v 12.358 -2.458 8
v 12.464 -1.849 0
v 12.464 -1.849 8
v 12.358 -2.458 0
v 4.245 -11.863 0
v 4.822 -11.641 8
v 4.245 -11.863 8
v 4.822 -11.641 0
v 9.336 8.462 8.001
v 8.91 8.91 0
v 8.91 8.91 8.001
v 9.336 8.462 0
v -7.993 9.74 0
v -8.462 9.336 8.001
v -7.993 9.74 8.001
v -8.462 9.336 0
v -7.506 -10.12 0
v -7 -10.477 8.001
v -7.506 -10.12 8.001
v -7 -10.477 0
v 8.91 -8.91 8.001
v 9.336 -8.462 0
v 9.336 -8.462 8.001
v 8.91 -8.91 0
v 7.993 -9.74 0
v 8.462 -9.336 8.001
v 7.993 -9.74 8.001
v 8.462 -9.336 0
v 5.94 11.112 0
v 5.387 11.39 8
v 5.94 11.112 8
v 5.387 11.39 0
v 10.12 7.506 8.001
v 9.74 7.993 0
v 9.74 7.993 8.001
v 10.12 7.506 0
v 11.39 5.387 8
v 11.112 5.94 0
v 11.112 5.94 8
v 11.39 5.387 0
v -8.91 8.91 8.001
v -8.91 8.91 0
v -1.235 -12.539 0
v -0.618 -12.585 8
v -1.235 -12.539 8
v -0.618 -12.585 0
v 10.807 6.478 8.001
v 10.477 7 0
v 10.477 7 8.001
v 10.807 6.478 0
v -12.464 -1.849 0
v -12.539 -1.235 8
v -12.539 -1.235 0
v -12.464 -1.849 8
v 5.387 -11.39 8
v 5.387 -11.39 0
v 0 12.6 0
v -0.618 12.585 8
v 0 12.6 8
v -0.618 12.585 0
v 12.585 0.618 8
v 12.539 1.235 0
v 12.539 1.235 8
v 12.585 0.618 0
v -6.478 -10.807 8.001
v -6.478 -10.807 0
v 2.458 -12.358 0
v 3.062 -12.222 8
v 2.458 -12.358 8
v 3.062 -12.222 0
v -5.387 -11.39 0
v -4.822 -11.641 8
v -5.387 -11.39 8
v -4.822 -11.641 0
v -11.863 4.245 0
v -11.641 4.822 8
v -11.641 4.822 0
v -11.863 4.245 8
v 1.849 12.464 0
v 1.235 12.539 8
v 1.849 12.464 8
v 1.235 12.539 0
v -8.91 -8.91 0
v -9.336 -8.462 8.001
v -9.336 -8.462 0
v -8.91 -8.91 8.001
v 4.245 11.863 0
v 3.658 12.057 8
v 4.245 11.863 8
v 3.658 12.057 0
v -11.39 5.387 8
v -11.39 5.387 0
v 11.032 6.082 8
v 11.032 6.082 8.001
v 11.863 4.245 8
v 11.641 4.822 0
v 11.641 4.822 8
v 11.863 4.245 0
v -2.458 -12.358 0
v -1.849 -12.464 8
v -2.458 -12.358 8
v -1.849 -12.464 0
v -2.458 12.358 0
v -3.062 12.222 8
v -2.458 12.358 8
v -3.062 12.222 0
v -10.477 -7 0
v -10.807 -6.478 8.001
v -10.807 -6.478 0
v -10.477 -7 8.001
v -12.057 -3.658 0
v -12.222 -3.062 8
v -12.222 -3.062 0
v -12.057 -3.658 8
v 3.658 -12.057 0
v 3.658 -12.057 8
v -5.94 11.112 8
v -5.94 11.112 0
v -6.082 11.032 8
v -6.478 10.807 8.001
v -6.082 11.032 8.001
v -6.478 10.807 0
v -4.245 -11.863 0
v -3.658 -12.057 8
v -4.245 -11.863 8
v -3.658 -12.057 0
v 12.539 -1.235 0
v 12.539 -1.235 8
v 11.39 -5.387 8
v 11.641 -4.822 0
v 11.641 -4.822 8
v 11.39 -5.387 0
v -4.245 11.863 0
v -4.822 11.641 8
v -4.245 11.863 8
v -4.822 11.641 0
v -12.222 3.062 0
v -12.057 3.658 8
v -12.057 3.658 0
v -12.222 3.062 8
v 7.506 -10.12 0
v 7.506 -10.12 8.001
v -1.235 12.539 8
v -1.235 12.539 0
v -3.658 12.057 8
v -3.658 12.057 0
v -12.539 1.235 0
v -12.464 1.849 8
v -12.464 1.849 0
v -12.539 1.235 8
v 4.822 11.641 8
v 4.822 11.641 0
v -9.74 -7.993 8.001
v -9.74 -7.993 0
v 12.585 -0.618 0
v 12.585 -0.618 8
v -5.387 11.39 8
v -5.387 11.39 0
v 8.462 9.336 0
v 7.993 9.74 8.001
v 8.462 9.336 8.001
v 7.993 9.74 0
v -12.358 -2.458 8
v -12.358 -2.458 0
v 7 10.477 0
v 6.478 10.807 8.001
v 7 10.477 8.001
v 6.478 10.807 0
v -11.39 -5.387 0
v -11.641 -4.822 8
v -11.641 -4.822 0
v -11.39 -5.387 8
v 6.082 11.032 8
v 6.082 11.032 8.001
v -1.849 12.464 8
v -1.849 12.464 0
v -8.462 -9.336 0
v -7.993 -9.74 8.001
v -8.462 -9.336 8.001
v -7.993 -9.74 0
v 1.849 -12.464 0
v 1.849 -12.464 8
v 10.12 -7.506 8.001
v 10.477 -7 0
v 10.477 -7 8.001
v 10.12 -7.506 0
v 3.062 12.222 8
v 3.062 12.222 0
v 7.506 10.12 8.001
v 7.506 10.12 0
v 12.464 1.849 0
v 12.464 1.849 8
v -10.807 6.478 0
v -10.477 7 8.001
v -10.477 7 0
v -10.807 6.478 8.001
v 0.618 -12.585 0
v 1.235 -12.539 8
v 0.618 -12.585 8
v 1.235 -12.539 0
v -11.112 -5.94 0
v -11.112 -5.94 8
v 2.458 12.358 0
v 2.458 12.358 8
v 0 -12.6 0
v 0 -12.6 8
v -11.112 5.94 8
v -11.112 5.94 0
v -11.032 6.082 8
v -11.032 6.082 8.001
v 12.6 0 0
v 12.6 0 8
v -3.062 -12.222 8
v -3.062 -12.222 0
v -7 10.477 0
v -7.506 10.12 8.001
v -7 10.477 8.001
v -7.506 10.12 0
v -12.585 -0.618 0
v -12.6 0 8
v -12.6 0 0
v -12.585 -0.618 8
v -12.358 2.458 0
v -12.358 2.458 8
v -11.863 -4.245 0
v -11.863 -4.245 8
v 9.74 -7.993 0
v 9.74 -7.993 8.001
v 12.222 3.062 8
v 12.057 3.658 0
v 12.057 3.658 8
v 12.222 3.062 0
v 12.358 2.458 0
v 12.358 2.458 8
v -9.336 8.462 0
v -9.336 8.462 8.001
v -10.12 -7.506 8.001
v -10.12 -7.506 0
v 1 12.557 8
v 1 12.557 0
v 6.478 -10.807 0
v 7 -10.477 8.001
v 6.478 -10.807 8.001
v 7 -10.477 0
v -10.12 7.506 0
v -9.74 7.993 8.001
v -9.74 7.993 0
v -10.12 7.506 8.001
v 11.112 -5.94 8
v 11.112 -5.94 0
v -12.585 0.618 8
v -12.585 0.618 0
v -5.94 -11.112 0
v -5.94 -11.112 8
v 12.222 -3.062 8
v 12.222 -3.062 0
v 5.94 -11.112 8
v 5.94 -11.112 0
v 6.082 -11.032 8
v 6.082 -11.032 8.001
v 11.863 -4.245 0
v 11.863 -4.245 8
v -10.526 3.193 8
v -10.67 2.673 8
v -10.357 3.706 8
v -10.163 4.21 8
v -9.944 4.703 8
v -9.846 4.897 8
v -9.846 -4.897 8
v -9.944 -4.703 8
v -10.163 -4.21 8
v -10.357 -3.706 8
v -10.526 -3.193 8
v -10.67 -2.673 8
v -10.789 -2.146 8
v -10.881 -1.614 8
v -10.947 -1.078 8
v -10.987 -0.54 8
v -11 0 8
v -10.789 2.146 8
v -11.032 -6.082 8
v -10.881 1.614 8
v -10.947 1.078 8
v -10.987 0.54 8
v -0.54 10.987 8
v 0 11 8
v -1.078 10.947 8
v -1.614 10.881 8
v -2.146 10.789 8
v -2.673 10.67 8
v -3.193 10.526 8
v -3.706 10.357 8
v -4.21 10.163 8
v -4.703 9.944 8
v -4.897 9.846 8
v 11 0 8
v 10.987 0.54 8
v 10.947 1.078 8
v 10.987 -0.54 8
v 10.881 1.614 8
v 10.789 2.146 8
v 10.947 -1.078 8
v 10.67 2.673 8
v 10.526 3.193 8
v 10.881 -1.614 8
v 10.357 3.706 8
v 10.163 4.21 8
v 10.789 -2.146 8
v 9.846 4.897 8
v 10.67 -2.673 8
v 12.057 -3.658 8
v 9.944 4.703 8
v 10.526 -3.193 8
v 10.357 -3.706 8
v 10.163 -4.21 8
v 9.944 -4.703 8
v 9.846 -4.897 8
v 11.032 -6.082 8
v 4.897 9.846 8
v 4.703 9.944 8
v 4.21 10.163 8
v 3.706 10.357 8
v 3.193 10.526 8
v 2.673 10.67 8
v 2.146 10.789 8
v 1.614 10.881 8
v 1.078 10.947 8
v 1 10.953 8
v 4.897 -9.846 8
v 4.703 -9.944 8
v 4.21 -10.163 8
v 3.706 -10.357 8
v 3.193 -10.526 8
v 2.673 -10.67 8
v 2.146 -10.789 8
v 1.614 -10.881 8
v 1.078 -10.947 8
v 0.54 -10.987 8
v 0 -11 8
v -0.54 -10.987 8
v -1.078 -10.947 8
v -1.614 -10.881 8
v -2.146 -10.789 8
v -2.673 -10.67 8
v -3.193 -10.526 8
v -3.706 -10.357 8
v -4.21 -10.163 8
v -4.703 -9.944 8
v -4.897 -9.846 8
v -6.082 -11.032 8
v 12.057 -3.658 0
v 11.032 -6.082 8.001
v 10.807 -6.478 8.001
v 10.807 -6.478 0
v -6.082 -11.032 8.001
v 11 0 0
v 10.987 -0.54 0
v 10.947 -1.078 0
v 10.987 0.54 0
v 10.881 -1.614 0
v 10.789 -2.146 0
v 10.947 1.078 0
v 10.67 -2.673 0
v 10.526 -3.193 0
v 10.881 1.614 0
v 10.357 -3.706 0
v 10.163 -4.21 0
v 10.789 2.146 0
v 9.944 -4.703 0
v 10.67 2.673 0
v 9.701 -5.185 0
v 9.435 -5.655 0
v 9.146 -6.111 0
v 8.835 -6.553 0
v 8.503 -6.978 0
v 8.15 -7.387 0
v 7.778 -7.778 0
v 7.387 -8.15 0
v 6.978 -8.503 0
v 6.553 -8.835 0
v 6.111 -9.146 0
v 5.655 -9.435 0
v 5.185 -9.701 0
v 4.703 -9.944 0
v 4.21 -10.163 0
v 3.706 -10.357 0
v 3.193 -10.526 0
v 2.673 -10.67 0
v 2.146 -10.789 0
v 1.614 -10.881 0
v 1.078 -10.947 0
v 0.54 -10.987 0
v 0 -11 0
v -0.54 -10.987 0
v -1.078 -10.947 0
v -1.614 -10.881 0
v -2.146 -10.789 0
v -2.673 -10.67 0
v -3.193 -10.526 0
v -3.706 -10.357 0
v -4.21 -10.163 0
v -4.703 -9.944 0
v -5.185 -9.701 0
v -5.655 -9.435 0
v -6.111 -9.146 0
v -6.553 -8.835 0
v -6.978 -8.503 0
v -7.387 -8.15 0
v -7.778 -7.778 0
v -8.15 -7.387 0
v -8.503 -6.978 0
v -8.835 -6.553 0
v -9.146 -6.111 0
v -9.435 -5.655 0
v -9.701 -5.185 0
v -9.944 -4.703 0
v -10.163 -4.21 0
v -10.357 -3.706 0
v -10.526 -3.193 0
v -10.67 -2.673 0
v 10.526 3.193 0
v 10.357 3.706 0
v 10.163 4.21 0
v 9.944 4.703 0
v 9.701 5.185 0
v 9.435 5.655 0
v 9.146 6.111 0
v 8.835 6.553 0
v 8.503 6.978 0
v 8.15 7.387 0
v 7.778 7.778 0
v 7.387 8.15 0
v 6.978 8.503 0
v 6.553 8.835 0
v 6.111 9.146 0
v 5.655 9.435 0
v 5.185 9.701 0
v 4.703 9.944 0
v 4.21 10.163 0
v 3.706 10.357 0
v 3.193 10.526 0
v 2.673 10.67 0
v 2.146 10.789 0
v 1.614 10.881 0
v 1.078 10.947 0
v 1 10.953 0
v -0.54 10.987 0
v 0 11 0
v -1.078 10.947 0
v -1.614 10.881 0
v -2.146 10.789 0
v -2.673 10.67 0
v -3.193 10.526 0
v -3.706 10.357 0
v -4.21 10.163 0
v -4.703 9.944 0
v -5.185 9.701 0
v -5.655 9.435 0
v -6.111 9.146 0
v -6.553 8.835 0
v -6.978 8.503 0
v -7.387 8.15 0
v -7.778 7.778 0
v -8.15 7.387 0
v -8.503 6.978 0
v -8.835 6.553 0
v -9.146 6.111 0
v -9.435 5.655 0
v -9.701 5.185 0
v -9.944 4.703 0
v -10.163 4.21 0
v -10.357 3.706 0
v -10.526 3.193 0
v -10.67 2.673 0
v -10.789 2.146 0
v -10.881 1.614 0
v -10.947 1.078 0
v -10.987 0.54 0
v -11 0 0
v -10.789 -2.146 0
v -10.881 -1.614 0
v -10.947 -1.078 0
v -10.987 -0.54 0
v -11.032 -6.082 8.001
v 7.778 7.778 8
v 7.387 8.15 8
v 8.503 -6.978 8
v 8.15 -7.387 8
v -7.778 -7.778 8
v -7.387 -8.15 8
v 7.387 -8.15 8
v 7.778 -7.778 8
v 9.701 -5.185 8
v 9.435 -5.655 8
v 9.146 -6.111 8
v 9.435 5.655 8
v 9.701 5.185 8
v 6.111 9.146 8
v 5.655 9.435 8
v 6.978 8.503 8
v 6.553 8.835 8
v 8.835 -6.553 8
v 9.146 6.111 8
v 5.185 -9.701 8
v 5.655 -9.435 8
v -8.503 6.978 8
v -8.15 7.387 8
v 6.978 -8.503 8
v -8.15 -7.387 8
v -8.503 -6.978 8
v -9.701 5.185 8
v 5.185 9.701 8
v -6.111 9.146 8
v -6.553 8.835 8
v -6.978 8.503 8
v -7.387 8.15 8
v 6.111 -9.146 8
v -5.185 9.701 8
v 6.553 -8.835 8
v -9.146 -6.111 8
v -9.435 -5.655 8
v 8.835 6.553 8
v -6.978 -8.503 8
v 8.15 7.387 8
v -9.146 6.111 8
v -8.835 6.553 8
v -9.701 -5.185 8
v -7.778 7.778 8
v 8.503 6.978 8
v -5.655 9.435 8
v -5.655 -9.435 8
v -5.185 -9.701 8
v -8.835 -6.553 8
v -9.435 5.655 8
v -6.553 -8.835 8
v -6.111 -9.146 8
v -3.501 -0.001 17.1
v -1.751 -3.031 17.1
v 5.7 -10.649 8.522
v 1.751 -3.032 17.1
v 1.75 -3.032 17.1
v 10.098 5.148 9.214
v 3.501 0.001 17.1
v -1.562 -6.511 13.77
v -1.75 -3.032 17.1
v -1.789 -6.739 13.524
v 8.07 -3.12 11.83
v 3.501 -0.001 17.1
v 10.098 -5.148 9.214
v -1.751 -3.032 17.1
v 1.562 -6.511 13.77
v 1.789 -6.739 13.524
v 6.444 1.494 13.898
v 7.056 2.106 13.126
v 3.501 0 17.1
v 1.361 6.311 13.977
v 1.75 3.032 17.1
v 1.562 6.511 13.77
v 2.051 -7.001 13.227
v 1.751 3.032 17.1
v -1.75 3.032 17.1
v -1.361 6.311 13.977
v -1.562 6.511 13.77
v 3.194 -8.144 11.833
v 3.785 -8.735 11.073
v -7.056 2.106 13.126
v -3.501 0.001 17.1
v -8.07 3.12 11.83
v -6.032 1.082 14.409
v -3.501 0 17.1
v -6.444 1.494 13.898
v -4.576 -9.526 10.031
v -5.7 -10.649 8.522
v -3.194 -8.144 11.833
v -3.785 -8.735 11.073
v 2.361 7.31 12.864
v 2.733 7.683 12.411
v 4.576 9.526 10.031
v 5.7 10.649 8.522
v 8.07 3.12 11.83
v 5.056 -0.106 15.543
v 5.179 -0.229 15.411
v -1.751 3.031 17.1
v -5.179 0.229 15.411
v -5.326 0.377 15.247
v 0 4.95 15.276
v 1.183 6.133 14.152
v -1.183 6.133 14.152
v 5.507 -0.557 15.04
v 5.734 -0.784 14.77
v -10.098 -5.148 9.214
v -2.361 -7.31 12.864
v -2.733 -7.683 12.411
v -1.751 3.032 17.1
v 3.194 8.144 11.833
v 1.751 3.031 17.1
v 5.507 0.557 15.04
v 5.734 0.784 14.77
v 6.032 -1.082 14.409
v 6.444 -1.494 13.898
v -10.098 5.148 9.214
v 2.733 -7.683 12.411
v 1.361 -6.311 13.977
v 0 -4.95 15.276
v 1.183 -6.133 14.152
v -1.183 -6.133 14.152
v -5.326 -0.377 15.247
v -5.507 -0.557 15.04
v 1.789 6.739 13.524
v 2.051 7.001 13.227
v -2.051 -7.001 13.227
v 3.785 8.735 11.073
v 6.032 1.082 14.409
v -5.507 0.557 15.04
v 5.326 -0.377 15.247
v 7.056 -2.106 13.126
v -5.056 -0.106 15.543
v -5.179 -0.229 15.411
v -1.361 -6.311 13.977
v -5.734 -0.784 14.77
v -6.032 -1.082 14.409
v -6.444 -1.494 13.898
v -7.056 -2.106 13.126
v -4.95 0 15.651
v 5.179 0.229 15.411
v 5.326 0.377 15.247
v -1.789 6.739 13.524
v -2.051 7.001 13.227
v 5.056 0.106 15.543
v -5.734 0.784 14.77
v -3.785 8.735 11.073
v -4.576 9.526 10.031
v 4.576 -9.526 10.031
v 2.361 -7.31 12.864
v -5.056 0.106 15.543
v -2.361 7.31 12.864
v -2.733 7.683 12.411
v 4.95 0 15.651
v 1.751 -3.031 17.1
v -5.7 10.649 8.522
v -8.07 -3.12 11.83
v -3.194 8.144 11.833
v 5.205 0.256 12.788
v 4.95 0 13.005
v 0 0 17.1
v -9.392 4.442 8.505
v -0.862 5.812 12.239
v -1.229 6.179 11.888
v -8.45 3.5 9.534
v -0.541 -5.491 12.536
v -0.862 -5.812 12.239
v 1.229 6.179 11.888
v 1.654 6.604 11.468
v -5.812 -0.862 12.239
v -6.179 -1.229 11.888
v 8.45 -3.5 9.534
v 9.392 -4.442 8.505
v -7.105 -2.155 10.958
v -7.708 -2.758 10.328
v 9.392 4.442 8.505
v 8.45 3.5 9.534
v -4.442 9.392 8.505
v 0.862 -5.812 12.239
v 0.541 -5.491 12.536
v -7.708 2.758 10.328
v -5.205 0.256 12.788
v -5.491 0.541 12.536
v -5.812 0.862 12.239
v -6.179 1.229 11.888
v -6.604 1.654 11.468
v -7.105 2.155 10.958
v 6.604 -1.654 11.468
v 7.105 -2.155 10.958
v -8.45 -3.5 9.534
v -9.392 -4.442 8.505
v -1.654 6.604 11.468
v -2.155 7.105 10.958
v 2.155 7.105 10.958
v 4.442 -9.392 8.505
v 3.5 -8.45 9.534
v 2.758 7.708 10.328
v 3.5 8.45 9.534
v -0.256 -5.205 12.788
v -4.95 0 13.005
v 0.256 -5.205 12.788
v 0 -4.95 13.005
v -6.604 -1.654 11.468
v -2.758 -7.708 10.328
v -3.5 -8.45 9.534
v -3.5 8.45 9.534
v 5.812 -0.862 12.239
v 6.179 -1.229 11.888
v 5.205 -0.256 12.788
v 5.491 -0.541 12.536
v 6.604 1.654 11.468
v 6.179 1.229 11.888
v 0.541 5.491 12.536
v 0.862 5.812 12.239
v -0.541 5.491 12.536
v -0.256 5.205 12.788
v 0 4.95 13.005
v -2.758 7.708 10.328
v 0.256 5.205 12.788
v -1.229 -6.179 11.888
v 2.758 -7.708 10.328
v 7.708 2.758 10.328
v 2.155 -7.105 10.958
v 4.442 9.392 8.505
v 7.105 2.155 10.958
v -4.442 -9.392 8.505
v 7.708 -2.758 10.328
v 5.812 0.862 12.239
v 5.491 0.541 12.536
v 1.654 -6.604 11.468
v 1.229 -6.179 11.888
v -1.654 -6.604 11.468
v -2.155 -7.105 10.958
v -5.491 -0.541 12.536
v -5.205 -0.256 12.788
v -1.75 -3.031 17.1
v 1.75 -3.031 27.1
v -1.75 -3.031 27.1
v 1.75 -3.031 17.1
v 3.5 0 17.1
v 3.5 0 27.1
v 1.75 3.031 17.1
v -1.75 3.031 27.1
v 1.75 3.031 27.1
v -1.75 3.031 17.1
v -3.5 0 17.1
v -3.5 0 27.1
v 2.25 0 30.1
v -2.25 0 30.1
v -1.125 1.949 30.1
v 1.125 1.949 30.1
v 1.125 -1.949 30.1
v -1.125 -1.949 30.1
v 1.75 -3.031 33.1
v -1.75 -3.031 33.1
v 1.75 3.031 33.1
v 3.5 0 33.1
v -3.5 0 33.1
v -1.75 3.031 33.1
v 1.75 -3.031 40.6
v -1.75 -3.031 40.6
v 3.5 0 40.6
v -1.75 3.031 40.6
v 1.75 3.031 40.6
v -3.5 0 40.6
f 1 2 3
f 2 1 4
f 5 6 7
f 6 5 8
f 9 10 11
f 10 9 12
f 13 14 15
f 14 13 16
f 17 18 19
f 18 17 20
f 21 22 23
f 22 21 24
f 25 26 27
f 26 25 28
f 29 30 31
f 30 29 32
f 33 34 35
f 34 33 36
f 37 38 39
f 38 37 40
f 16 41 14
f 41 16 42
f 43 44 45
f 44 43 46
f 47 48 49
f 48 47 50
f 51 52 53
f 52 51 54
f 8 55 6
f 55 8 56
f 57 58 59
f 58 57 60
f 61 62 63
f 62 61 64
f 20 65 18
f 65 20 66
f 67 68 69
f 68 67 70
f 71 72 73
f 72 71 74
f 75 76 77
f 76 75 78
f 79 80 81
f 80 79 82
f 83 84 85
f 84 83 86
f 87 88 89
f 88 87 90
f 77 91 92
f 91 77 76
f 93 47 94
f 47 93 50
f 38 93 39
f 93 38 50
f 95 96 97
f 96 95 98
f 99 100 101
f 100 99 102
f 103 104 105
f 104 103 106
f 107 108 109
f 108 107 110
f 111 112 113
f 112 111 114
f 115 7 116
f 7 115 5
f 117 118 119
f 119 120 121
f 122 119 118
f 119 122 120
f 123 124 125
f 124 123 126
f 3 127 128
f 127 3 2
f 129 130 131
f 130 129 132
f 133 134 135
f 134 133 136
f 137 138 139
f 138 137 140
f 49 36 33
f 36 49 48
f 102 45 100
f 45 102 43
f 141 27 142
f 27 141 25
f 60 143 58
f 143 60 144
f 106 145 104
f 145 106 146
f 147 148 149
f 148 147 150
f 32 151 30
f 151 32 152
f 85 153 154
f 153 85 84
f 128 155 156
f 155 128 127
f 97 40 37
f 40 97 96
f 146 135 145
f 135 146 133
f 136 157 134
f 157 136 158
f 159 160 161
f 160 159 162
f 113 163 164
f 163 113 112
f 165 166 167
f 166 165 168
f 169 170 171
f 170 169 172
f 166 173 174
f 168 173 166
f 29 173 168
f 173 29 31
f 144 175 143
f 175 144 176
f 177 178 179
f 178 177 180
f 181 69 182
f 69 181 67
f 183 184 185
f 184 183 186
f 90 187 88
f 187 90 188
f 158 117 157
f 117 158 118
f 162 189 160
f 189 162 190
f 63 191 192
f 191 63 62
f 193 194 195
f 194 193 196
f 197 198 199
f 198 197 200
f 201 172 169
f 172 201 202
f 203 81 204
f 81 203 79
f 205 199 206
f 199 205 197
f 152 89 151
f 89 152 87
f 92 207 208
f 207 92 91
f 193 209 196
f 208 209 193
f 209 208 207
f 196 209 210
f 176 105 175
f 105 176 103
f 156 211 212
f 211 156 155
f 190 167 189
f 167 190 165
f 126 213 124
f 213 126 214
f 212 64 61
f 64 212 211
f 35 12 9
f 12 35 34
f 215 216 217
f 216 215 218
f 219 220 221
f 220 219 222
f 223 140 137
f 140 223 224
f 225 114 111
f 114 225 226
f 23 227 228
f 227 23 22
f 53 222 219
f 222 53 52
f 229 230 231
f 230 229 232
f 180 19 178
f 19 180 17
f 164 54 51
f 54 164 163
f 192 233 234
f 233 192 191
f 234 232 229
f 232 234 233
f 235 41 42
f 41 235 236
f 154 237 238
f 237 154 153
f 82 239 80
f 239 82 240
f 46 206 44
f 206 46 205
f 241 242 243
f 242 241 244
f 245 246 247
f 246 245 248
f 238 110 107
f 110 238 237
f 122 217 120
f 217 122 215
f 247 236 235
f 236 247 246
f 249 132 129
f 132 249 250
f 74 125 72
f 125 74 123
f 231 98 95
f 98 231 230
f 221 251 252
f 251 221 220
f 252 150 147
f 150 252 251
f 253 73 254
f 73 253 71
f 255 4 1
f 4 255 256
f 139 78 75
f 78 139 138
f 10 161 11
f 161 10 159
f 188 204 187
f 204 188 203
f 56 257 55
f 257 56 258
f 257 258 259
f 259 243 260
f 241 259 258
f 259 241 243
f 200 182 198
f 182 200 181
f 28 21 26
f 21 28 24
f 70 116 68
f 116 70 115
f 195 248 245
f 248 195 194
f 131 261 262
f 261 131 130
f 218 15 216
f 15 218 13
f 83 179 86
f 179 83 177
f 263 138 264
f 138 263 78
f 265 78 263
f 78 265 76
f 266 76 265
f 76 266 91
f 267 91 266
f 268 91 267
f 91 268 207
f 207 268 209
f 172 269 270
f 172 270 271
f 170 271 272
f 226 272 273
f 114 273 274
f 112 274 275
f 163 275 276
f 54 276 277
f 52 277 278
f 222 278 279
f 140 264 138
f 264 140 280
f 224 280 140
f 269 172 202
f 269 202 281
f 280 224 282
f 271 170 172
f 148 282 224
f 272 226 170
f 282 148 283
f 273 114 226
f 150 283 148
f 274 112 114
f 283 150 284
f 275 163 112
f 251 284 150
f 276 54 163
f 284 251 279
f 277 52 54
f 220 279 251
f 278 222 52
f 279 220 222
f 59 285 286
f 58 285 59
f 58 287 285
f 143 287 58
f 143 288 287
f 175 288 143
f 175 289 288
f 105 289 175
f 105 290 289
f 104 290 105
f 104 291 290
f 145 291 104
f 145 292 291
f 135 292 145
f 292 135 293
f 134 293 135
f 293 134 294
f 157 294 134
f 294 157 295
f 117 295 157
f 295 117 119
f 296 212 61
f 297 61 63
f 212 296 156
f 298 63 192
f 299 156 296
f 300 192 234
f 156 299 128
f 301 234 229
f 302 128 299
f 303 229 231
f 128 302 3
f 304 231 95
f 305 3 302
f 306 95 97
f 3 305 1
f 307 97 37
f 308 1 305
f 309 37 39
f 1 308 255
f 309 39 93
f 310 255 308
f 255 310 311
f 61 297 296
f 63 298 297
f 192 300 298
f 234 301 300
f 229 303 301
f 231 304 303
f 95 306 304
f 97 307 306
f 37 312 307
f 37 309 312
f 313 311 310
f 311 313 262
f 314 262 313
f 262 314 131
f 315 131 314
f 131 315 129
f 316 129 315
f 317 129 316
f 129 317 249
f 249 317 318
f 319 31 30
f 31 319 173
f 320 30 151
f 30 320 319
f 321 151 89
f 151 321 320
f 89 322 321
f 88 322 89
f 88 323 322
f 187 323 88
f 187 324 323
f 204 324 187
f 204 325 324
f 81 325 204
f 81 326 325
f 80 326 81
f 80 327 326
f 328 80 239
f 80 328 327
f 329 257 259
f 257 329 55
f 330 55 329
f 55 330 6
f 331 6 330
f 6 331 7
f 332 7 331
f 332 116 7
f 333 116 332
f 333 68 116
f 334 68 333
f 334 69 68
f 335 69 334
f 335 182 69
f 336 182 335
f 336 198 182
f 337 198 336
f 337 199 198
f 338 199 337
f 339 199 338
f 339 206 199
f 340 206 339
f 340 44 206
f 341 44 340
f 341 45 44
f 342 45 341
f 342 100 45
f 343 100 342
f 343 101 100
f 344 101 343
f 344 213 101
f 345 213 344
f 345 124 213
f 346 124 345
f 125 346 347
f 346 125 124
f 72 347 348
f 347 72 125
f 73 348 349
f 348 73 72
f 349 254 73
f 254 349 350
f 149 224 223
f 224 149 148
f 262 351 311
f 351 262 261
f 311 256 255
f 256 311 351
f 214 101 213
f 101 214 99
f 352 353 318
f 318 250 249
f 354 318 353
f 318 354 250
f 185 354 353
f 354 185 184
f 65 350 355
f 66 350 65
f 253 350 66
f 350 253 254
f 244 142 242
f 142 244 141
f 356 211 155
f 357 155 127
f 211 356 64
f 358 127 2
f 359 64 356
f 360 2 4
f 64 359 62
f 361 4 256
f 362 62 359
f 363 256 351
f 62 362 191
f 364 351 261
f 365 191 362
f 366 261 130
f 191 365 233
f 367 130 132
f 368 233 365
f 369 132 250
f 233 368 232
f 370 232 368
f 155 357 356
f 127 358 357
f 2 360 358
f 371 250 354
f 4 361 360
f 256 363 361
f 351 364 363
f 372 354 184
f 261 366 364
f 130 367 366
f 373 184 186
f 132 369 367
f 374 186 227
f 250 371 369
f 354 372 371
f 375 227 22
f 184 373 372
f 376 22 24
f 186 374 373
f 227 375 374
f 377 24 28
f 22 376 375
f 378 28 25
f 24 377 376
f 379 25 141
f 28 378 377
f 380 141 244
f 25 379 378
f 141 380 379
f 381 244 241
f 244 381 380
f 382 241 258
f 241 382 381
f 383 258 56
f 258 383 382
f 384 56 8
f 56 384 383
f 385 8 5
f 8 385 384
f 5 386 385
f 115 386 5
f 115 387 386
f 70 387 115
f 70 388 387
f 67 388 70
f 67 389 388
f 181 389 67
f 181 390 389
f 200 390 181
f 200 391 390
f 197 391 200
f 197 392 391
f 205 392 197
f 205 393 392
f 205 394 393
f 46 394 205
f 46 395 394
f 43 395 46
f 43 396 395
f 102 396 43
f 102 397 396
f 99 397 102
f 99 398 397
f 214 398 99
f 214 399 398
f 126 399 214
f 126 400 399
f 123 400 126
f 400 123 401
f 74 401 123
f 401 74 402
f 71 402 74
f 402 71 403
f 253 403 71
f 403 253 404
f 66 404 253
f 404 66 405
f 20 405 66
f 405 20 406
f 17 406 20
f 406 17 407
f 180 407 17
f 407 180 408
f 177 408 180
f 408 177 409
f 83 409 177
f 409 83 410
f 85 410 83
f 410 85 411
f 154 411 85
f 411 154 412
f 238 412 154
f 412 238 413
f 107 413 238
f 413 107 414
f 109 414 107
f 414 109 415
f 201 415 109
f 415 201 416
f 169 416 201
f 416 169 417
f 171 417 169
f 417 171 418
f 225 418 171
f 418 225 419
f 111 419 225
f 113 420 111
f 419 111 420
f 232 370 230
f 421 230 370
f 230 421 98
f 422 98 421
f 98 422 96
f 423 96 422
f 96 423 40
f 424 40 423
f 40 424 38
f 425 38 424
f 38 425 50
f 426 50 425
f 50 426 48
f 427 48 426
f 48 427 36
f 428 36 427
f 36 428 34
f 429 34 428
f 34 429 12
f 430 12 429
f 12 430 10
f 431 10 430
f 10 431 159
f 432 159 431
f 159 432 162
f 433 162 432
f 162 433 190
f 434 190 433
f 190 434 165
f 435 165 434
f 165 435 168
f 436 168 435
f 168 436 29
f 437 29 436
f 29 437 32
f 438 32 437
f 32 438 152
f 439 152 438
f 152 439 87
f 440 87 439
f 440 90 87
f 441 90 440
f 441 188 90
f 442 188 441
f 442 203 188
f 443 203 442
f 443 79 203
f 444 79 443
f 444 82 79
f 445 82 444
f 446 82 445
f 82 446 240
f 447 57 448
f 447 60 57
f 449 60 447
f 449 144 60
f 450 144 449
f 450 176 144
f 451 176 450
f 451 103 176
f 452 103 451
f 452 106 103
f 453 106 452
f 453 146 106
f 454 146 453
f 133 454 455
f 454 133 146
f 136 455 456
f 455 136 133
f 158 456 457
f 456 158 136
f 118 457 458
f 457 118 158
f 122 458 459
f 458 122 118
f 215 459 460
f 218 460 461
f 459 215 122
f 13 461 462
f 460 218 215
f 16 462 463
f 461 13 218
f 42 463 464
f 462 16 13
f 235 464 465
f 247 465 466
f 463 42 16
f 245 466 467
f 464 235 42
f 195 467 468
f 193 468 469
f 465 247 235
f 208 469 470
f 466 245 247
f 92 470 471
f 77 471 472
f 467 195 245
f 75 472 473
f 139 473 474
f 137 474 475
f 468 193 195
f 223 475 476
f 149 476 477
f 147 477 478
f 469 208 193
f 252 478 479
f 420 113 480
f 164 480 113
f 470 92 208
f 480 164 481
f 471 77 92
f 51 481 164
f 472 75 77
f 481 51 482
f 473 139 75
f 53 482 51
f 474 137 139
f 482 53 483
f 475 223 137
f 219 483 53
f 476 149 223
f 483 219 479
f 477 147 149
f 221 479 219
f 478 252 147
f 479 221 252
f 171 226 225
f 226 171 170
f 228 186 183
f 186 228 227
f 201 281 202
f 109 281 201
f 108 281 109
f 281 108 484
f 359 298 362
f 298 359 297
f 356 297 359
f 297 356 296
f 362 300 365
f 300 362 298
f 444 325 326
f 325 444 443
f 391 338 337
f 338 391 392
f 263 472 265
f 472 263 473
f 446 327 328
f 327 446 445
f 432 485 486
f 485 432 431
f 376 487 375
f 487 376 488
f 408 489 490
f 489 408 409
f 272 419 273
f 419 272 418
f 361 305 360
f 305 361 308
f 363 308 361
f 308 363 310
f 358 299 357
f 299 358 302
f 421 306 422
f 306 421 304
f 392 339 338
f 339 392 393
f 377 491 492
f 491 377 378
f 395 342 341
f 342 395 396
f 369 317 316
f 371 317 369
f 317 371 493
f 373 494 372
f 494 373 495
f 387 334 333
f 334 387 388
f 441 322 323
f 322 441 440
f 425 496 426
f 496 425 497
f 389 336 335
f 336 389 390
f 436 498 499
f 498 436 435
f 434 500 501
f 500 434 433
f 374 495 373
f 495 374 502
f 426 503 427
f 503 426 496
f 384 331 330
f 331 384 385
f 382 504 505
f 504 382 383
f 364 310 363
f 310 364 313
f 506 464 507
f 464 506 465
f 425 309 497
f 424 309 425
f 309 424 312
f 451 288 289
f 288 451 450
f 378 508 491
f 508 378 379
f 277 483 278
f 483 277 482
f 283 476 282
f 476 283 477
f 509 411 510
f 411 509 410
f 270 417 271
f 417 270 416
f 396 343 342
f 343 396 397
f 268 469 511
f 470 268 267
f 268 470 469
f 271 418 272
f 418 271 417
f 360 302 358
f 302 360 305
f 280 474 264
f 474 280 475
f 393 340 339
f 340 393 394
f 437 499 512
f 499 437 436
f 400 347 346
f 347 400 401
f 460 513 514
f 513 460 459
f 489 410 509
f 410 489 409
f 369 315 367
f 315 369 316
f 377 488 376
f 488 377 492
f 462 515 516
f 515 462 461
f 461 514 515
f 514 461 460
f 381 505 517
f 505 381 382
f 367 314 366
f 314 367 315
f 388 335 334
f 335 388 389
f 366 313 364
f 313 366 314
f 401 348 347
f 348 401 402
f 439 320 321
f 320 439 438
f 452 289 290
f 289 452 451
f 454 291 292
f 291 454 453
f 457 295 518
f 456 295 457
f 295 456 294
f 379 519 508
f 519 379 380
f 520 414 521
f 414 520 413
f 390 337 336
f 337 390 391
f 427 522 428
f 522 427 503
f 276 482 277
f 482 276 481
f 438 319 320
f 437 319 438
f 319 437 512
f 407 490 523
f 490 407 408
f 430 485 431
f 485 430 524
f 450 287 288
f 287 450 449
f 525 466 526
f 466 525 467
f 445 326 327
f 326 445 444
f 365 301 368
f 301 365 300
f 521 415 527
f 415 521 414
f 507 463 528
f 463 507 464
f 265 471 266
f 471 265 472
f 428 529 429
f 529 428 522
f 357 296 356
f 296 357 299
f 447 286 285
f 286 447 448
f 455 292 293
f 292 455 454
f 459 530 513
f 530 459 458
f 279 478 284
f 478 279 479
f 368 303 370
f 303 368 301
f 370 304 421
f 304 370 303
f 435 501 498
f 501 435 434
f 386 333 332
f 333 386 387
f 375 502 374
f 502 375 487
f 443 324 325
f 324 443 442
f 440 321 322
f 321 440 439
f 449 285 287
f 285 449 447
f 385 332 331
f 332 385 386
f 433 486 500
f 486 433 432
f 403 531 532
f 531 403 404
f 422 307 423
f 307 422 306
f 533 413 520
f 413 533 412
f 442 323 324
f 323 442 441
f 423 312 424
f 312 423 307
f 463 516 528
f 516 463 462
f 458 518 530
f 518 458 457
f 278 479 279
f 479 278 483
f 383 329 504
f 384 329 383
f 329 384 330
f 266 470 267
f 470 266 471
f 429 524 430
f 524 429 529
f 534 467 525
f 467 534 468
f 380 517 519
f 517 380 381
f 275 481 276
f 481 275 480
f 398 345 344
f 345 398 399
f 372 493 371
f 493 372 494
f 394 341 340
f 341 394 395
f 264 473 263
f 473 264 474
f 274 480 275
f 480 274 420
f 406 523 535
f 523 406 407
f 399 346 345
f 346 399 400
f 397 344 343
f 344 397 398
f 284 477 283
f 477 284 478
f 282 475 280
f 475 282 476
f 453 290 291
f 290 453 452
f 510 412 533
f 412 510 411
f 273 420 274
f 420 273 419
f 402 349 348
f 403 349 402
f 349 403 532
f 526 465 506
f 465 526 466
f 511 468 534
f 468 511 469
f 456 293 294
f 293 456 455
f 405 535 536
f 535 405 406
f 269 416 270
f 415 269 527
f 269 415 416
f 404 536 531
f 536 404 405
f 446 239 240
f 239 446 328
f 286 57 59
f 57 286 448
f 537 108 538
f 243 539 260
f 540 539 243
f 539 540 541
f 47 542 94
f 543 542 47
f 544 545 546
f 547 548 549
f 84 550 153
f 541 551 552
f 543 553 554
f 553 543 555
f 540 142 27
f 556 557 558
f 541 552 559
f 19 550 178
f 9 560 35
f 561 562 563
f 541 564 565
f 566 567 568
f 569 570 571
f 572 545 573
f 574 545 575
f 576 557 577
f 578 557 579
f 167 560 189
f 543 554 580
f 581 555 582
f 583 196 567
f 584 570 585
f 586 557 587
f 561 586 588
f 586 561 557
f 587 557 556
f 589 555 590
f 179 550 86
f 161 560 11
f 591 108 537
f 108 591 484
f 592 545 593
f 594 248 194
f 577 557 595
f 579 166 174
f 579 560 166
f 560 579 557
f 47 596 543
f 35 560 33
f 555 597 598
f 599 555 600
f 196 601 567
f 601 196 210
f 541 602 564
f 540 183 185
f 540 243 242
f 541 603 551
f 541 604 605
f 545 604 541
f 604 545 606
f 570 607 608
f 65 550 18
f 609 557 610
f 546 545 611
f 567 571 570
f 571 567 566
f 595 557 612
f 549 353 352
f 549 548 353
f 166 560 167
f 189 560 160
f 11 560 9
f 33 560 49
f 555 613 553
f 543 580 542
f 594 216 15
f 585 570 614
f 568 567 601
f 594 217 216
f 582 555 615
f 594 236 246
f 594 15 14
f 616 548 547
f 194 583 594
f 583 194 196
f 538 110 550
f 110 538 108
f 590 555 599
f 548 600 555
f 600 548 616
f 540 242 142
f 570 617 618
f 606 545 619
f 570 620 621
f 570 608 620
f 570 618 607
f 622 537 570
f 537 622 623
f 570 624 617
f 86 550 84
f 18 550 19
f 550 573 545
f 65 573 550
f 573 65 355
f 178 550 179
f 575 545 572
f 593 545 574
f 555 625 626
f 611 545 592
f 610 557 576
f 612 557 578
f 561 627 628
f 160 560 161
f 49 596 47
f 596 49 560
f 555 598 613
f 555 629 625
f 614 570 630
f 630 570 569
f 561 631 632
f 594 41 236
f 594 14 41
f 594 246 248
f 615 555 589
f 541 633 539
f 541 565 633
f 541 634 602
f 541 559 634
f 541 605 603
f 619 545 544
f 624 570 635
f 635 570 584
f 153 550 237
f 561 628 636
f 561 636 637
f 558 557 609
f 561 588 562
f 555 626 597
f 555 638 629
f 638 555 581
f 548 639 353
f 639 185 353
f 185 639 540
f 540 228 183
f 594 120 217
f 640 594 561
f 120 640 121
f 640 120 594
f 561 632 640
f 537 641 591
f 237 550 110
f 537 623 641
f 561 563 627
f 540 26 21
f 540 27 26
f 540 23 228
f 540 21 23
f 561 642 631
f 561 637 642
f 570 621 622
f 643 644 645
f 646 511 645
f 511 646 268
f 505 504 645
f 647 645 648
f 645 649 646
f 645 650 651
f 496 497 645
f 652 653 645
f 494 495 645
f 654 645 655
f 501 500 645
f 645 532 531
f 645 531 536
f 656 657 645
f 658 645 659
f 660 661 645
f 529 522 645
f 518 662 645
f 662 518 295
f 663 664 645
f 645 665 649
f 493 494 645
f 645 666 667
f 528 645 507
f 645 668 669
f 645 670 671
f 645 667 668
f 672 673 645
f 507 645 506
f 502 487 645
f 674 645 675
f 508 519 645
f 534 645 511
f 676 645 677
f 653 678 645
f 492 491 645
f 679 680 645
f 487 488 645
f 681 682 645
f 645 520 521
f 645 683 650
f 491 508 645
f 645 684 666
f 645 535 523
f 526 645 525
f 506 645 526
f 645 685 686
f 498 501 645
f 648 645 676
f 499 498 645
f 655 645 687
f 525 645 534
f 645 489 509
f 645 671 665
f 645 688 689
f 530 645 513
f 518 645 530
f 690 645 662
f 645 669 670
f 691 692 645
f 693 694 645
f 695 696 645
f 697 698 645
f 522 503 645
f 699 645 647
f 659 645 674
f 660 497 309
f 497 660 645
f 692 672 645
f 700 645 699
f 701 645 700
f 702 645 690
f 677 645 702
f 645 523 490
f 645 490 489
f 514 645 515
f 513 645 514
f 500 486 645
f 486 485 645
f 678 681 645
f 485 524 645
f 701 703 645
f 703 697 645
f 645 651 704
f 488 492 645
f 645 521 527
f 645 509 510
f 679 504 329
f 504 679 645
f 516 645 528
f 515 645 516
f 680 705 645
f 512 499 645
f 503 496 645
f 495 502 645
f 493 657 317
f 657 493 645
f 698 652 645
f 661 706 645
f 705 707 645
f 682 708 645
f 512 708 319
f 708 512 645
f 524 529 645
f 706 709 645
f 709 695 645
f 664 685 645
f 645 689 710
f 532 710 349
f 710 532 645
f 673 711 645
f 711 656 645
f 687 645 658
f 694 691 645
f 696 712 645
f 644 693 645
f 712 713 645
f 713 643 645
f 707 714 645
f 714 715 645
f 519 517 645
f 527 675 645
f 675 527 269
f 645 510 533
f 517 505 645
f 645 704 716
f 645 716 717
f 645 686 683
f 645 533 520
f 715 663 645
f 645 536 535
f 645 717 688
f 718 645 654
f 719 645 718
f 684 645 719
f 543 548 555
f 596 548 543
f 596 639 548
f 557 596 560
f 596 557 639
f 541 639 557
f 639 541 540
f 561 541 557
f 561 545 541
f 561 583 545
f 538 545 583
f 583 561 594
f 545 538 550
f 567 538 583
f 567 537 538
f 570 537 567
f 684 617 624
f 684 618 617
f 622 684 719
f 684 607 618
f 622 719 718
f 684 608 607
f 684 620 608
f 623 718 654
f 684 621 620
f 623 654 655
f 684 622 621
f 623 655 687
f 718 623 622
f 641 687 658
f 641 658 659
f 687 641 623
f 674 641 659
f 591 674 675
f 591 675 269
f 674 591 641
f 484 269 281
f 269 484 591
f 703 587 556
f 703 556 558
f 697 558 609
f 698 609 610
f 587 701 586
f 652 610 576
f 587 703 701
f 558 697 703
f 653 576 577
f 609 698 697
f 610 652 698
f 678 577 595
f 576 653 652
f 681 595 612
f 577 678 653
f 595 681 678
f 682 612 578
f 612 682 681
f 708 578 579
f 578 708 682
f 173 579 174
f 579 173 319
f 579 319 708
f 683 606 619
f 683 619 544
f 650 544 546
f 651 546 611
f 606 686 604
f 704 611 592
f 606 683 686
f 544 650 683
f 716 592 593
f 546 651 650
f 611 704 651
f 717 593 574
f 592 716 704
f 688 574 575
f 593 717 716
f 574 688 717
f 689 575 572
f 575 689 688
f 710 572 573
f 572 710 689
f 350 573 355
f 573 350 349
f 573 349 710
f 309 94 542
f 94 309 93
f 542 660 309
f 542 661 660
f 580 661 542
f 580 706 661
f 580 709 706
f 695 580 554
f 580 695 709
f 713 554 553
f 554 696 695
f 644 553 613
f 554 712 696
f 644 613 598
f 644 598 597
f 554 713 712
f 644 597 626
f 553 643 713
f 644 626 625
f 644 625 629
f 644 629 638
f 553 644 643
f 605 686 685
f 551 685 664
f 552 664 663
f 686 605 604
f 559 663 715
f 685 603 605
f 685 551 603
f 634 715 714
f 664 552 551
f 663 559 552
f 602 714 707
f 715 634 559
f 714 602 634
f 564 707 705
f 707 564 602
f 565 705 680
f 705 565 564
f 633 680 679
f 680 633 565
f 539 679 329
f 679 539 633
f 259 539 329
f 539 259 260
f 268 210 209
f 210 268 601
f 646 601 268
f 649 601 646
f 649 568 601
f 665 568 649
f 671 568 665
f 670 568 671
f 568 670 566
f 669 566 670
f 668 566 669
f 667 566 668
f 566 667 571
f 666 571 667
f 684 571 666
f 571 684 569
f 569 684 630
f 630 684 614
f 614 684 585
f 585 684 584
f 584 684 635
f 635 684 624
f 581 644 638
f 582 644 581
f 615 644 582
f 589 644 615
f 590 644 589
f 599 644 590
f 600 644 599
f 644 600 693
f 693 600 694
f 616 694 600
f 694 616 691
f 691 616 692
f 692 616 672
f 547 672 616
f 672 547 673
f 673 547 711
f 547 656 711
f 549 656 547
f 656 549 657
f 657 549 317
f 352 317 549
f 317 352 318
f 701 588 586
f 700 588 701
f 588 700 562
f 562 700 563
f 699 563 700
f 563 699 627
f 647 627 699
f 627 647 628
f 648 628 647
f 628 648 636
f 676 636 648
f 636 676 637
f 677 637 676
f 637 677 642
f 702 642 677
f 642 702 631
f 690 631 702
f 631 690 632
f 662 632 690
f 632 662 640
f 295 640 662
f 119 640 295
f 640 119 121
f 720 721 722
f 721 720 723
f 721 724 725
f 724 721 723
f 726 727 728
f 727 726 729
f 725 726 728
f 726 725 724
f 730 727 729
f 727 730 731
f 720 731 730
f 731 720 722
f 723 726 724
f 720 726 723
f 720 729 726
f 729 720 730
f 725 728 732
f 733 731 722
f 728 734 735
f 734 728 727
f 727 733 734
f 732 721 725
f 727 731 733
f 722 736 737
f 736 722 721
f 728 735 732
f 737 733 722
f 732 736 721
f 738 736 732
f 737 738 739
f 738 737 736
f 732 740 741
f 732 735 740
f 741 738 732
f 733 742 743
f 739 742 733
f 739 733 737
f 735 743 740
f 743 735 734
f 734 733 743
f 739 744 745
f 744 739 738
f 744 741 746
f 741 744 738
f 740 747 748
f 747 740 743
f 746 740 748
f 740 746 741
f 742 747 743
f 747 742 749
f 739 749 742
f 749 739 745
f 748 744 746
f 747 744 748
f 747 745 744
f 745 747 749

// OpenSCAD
$fn = $preview ? 16 : 128;

tiny = 1e-3;
large = 1e3;

/* [Bearing dimensions] */
b_outer_diam = 22;
b_inner_diam = 8;
b_height = 8;

wall_width = 1.6;

wall_diam = b_outer_diam + 2*wall_width;

gap_size = 1;
mount_width = 15;
mount_length = 12.5;

screw_diam = 4;
screw_head_diam = 7.4;

bit_diam = 7;
bit_neck_z_offset = 7.5;
bit_neck_height = 6;
bit_neck_diam = 4.5;
bit_end_length = 10;


conversion_height = (b_outer_diam + 2*wall_width - bit_diam) / 2; // 45 degree angle

// ------ CODE ------



difference() {
    hull() {
        cylinder(b_height, d=b_outer_diam + 2*wall_width);

        /*
        translate([-mount_width/2, b_outer_diam / 2, 0])
        cube([mount_width, mount_length, b_height]);
        */
    }
    
    
    
    cylinder(b_height, d=b_outer_diam);
    
    
    cube([gap_size, wall_diam, b_height]);
    /*
    
    // Screw hole
    translate([0, (b_outer_diam + mount_length) / 2, b_height/2])
    rotate([0, 90, 0]) {
        cylinder(h=wall_diam, d=screw_diam, center=true);
        
        
        // head
        //mirror([0, 0, 1])
        translate([0, 0, mount_length/2])
        cylinder(h=large, d=screw_head_diam);
        
        
        // nut
        mirror([0, 0, 1])
        translate([0, 0, mount_length/2])
        rotate([0, 0, 360/12])
        cylinder(h=large, d=screw_head_diam, $fn=6);
        
        
    }
    */
    
}






// Conversion
translate([0, 0, b_height]) {
    intersection() {
        difference() {
            hull() {
                cylinder(h=tiny, d=wall_diam);
                
                translate([0, 0, conversion_height])
                cylinder(h=tiny, d=bit_diam, $fn=6);
            }
            cylinder(h=conversion_height, d1=b_outer_diam, d2=0);
        }
        
        rotate([0, 0, 45])
        union() {
            cube([wall_diam, bit_diam, 2*conversion_height], center=true);
        
            rotate([0, 0, 90])
            cube([wall_diam, bit_diam, 2*conversion_height], center=true);
        }
    }

}



// Chuck holder
translate([0, 0, b_height + conversion_height]) {// guessed
    cylinder(h=bit_end_length, d=bit_diam, $fn=6);

    // neck
    translate([0, 0, bit_end_length])
    cylinder(h=bit_neck_height/2, d1 = bit_diam, d2=bit_neck_diam, $fn=6);
    translate([0, 0, bit_end_length + bit_neck_height/2])
    cylinder(h=bit_neck_height/2, d1 = bit_neck_diam, d2=bit_diam, $fn=6);

    
    translate([0, 0, bit_end_length + bit_neck_height])
    cylinder(h=bit_neck_z_offset, d=bit_diam, $fn=6);
    
}
